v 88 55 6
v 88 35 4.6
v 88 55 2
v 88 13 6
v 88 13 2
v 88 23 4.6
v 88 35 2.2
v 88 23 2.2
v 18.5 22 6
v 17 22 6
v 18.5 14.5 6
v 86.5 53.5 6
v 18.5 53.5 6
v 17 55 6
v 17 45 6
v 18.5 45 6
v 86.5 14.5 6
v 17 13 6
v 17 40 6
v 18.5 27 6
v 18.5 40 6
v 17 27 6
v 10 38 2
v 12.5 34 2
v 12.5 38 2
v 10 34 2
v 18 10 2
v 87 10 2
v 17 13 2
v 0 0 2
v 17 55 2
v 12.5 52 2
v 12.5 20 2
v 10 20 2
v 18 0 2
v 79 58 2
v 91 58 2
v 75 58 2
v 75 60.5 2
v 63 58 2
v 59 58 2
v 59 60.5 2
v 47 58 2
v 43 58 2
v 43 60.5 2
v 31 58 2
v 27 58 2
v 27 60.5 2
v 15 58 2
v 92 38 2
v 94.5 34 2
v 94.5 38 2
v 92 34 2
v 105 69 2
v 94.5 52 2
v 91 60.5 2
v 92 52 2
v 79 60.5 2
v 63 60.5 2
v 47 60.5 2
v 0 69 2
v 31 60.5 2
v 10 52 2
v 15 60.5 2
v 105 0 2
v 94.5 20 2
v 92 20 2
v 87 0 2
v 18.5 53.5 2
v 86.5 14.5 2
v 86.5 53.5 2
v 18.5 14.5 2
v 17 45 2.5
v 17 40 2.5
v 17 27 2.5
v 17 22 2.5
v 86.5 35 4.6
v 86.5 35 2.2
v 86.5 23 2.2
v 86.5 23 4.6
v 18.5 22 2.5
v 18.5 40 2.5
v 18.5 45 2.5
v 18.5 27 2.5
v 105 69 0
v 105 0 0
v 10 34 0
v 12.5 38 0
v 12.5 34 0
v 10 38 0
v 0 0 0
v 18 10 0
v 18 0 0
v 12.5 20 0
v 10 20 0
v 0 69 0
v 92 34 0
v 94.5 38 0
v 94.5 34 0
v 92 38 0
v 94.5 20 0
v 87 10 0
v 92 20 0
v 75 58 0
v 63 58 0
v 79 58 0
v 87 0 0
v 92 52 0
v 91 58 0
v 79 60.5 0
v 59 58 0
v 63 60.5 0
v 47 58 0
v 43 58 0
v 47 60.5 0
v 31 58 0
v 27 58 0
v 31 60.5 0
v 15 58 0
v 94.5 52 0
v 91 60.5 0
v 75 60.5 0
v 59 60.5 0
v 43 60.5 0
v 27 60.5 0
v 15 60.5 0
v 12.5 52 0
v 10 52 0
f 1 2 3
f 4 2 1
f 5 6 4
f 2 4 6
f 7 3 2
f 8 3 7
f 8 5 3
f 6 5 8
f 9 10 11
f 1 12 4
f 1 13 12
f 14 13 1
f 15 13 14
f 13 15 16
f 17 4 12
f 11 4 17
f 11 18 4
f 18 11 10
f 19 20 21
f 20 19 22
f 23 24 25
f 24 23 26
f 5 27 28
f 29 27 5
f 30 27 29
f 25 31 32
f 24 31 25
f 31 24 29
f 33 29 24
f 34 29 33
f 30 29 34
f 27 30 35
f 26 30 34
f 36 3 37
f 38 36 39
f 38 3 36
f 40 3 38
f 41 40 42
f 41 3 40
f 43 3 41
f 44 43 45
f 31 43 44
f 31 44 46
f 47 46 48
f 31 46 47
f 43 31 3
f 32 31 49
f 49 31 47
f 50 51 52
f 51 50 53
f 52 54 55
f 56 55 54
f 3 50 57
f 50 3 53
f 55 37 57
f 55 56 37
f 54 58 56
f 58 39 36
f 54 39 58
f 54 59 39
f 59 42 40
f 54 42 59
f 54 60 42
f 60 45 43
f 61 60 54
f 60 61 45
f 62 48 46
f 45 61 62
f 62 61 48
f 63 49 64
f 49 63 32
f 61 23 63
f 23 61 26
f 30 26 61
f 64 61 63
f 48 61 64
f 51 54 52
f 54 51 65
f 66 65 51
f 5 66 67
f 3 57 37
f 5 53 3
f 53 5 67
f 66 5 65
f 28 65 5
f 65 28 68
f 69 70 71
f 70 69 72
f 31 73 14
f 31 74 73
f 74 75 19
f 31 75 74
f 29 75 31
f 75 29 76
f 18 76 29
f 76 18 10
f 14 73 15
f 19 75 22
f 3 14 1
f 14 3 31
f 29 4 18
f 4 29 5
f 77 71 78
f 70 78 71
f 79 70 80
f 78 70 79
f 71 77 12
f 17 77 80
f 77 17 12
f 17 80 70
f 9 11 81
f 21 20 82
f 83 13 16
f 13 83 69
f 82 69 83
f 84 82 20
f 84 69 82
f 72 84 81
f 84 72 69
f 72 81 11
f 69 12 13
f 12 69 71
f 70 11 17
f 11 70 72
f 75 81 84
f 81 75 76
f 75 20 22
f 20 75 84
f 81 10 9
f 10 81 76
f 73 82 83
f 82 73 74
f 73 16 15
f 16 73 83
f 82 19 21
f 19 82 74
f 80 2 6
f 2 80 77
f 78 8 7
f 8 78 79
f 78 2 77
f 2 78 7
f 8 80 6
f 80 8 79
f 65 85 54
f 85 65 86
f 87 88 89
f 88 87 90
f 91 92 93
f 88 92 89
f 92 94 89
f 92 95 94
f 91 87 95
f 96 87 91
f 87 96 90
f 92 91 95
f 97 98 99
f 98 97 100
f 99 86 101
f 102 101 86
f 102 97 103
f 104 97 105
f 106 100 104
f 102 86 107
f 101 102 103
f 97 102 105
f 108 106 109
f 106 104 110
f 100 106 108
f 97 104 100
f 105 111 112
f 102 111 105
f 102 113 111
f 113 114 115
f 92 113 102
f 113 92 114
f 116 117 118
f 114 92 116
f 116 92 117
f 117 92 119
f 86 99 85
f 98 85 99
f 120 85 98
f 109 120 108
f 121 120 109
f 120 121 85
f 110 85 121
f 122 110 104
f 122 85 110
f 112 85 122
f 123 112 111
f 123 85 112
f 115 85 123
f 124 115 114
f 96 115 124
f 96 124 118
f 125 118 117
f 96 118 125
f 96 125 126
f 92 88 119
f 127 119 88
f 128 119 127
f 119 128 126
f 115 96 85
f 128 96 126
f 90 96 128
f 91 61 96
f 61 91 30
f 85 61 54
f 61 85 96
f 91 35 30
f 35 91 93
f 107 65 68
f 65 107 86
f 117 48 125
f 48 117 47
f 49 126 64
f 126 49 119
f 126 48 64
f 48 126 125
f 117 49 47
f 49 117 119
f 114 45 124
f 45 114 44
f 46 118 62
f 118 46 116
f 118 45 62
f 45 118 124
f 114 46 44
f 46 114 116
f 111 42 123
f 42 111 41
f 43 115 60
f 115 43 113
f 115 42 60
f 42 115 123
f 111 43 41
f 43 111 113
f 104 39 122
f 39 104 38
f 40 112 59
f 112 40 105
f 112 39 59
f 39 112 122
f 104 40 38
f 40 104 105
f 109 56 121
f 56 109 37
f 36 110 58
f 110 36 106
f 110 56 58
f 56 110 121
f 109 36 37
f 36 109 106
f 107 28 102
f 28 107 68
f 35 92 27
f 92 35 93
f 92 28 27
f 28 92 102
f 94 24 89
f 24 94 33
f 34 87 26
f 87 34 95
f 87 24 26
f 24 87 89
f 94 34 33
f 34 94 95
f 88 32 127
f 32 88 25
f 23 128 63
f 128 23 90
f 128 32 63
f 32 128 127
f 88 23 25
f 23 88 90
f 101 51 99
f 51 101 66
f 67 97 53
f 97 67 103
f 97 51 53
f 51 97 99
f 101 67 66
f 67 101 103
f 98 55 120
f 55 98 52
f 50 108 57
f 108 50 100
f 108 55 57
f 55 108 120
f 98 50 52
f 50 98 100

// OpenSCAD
// file: ../../00_common/parameters.scad
// =============================================================================
// OpenMotorBridge - Global CAD Parameters & Settings
// =============================================================================
// File: hardware/cad/scad/00_common/parameters.scad
// Description: Global dimensional constants, manufacturing clearances and
//              circle resolution ($fn) for all OpenSCAD modules.
// =============================================================================

// --- 1. Circle & Curve Resolution ---
$fn = 60; // Smooth cylinders and holes for high-quality MJF 3D printing

// --- 2. Central Main Box Dimensions (3-Tier Sandwich) ---
MAIN_BOX_OUTER_L      = 110.0; // Outer length in X (mm)
MAIN_BOX_OUTER_W      = 74.0;  // Outer width in Y (mm)
MAIN_BOX_LOWER_H      = 17.0;  // Lower case height in Z (mm)
MAIN_BOX_MID_H        = 15.0;  // Mid tray height in Z (mm)
MAIN_BOX_LID_H        = 4.0;   // Lid plate thickness in Z (mm)
MAIN_BOX_WALL         = 2.5;   // Nominal wall thickness (mm)
MAIN_BOX_CORNER_POST  = 7.0;   // Corner clamping screw post size (mm, for M3 hex nut pockets)

// --- 3. Satellite Pod Dimensions (Universal Enlarged Envelope) ---
POD_OUTER_L           = 150.0; // Outer length in X (mm, standardized for serial PCBA 03 + Cardo/Sena/OMM)
POD_OUTER_W           = 70.0;  // Outer width in Y (mm)
POD_OUTER_H           = 38.0;  // Outer height in Z (mm)
POD_WALL              = 3.5;   // Nominal wall thickness (mm)
POD_BULKHEAD_X        = 18.0;  // Partition bulkhead position in X (mm)
POD_CHAMBER_L         = 132.0; // Sliding chamber length in X (mm, clears 130mm sled + 2mm margin)
POD_CHAMBER_W         = 63.0;  // Sliding chamber width in Y (mm)
POD_CHAMBER_H         = 31.0;  // Sliding chamber height in Z (mm)

// --- 4. Pod Linear Guide Rails (Poka-Yoke Tongue & Groove) ---
POD_GROOVE_W          = 3.0;   // Internal guide groove width in Z (mm)
POD_GROOVE_DEPTH      = 1.5;   // Internal guide groove depth in Y (mm)
POD_GROOVE_LEFT_Z     = 10.0;  // Center height of left groove (mm)
POD_GROOVE_RIGHT_Z    = 18.0;  // Center height of right groove (mm, asym offset)

CARTRIDGE_TONGUE_W    = 2.6;   // Cartridge tongue rail height in Z (mm, 0.2mm clearance)
CARTRIDGE_TONGUE_PROT = 1.4;   // Cartridge tongue protrusion in Y (mm, 0.1mm clearance)
CARTRIDGE_CHAMFER_L   = 4.0;   // 30° lead-in chamfer nose length (mm)

// --- 5. Cartridge Dimensions (Enlarged Universal Sled) ---
CARTRIDGE_BASE_L      = 130.0; // Sled length in X (mm, accommodates PCBA 03 + OEM Cardo Air-Mount/Sena/OMM serial layout)
CARTRIDGE_BASE_W      = 58.0;  // Sled width in Y (mm)
CARTRIDGE_BASE_H      = 28.0;  // Sled height in Z (mm)
CARTRIDGE_FACE_L      = 4.0;   // Front faceplate thickness in X (mm)
CARTRIDGE_FACE_W      = 64.0;  // Front faceplate width in Y (mm)
CARTRIDGE_FACE_H      = 34.0;  // Front faceplate height in Z (mm)

// --- 5a. RF Interface & Sealing Dimensions ---
SMA_BORE_R            = 3.25;  // Ø 6.5 mm through-hole for standard SMA bulkhead
SMA_ORECESS_R         = 4.75;  // Ø 9.5 mm recess for waterproof silicone O-ring
SMA_ORECESS_DEPTH     = 1.2;   // 1.2 mm deep O-ring compression pocket

// --- 5b. Magnetic Anti-Theft Lock System ---
LATCH_PIVOT_X         = 65.0;  // Center pivot position along sled X (mm, centered on 130mm sled)
LATCH_MAGNET_X        = 53.0;  // Ferromagnetic anchor position along sled X (mm)
LATCH_TOOTH_X         = 77.0;  // Locking sawtooth pawl position along sled X (mm)
LATCH_ARM_H           = 6.0;   // Rocker lever height in Z (mm)
LATCH_ARM_THICK       = 2.6;   // Rocker beam thickness in Y (mm)
LATCH_MAGNET_PIN_DIA  = 6.2;   // Bore for Ø 6.0 mm steel dowel pin (mm)
LATCH_SPRING_DIA      = 3.8;   // Bore for Ø 3.5 mm return compression spring (mm)

// --- 6. Standard Captive Hex Nut Pockets (DIN 934 / DIN 985 with +0.2 mm MJF/FDM clearance) ---
NUT_M2_SW             = 4.2;   // M2 across flats (nominal 4.0 mm)
NUT_M2_H              = 1.8;   // M2 thickness (nominal 1.6 mm)
NUT_M2_5_SW           = 5.2;   // M2.5 across flats (nominal 5.0 mm)
NUT_M2_5_H            = 2.2;   // M2.5 thickness (nominal 2.0 mm)
NUT_M3_SW             = 5.7;   // M3 across flats (nominal 5.5 mm)
NUT_M3_H              = 2.6;   // M3 thickness (nominal 2.4 mm)
NUT_M4_SW             = 7.2;   // M4 across flats (nominal 7.0 mm)
NUT_M4_H              = 3.4;   // M4 thickness (nominal 3.2 mm)
NUT_M5_SW             = 8.2;   // M5 across flats (nominal 8.0 mm)
NUT_M5_H              = 4.2;   // M5 thickness (nominal 4.0 mm)

// Direct Plastic Thread-Forming / Self-Tapping Pilot Holes in PA12 (100% Soldering-Iron Free)
M2_PILOT_HOLE_R       = 0.85;  // Core hole for M2 screws in PA12 (Ø 1.7 mm)
M2_5_PILOT_HOLE_R     = 1.05;  // Core hole for M2.5 screws in PA12 (Ø 2.1 mm)
M3_PILOT_HOLE_R       = 1.25;  // Core hole for M3 screws in PA12 (Ø 2.5 mm)

// --- 7. Screw & Clearance Dimensions ---
M2_SCREW_HOLE_R       = 1.1;   // M2 clearance hole (r = 1.1 mm -> Ø 2.2 mm)
M2_5_SCREW_HOLE_R     = 1.4;   // M2.5 clearance hole (r = 1.4 mm -> Ø 2.8 mm)
M3_SCREW_HOLE_R       = 1.65;  // M3 clearance hole (r = 1.65 mm -> Ø 3.3 mm)
M4_SCREW_HOLE_R       = 2.2;   // M4 clearance hole (r = 2.2 mm -> Ø 4.4 mm)
M8_BORE_R             = 4.0;   // M8 cable through-bore (r = 4.0 mm -> Ø 8.0 mm)
M8_STUDS_OUTER_R      = 6.0;   // M8 neck outer radius (Ø 12.0 mm)

// --- 8. Universal Front Node Enclosure Dimensions (Type E: 98 x 68 x 25 mm) ---
FRONT_NODE_PCB_L      = 82.0;  // PCB length in X (mm, PCBA 05)
FRONT_NODE_PCB_W      = 50.0;  // PCB width in Y (mm, PCBA 05)
FRONT_NODE_PCB_H      = 1.6;   // PCB thickness in Z (mm)
FRONT_NODE_PCB_R      = 2.5;   // PCB corner radius (mm)

FRONT_NODE_CHAMBER_L  = 86.0;  // Internal chamber length in X (mm, 2mm margin per side)
FRONT_NODE_CHAMBER_W  = 56.0;  // Internal chamber width in Y (mm, 3mm margin per side)
FRONT_NODE_TUB_H      = 17.5;  // Lower tub depth in Z (mm)
FRONT_NODE_LID_H      = 7.5;   // Upper lid height in Z (mm)
FRONT_NODE_WALL       = 2.5;   // Wall thickness in HP MJF PA12 (mm)
FRONT_NODE_CORNER_R   = 4.0;   // Outer enclosure corner radius (mm)

FRONT_NODE_OUTER_L    = FRONT_NODE_CHAMBER_L + 2 * FRONT_NODE_WALL + 7.0; // 98.0 mm
FRONT_NODE_OUTER_W    = FRONT_NODE_CHAMBER_W + 2 * FRONT_NODE_WALL + 7.0; // 68.0 mm
FRONT_NODE_OUTER_H    = FRONT_NODE_TUB_H + FRONT_NODE_LID_H;              // 25.0 mm

// PCB Standoff Heights & Radii (100% Soldering-Iron Free)
FRONT_NODE_STANDOFF_H = 3.0;   // Height of PCB standoffs from floor (mm)
FRONT_NODE_STANDOFF_R = 3.0;   // Outer radius of M2.5 screw bosses (mm)
FRONT_NODE_CORE_HOLE_R= M2_5_PILOT_HOLE_R; // Core hole for direct M2.5 screw engagement (Ø 2.1 mm)

// AMPS 4-Hole Mounting Pattern (38 x 30 mm with DIN 934 M4 Captive Nut Pockets)
AMPS_SPACING_X        = 38.0;  // AMPS hole distance in X (mm)
AMPS_SPACING_Y        = 30.0;  // AMPS hole distance in Y (mm)
AMPS_NUT_SW           = NUT_M4_SW; // Captive M4 hex nut pocket across flats (7.2 mm)
AMPS_NUT_H            = NUT_M4_H;  // Captive M4 hex nut pocket depth (3.4 mm)

// Acoustic Vent for Knowles SPH0645 MEMS
FRONT_NODE_MIC_HOLE_R = 1.25;  // Sound canal radius (Ø 2.5 mm)
FRONT_NODE_MIC_MEMB_R = 3.0;   // Gore ePTFE membrane pocket radius (Ø 6.0 mm)
FRONT_NODE_MIC_MEMB_D = 0.8;   // Membrane pocket depth (mm)
// main file
// =============================================================================
// OpenMotorBridge - Main Box: Mid Partition Floor (Zwischenboden)
// =============================================================================
// File: hardware/cad/scad/01_main_box/parts/011_mid_partition_floor.scad
// =============================================================================

include <../../00_common/parameters.scad>;

module main_box_mid_partition_floor(floor_l=105.0, floor_w=69.0, floor_t=2.0) {
    difference() {
        union() {
            // 1. Solid Base Floor Plate
            cube(size=[floor_l, floor_w, floor_t], center=false);

            // 2. Integrated LiPo Battery Cradle Frame (71.0 x 42.0 x 4.0 mm, fits 2200 mAh 5.0mm flat cell)
            translate([17.0, 13.0, floor_t]) {
                difference() {
                    cube(size=[71.0, 42.0, 4.0], center=false);
                    // Inner cavity for battery
                    translate([1.5, 1.5, -0.1])
                        cube(size=[68.0, 39.0, 4.2], center=false);
                    // Left Side: 2x Hinge Pivot Sockets (for 013_battery_antenna_bridge tabs)
                    translate([-0.5, 9.0, 0.5])
                        cube(size=[2.5, 5.0, 3.6], center=false);
                    translate([-0.5, 27.0, 0.5])
                        cube(size=[2.5, 5.0, 3.6], center=false);
                    // Right Side: Snap Catch Recess (for 013 cantilever latch barb)
                    translate([71.0 - 1.5, 10.0, 0.2])
                        cube(size=[2.0, 12.0, 2.4], center=false);
                }
            }
        }

        // 3. Wide Open Front Cable Bay (70 x 10 mm open toward front Y=0)
        // Seamlessly clears all 6 cables (12-Pin, 10-Pin, Battery, Power, LoRa, 2.4G)
        translate([18.0, -0.5, -0.5])
            cube(size=[69.0, 10.5, floor_t + 1.0], center=false);

        // 4. Enhanced Convective Ventilation & Air Circulation Slots (10x slots):
        // Rear Row (5x slots along y = 58.0 mm)
        for (i = [0:4]) {
            translate([15.0 + i * 16.0, 58.0, -0.5])
                cube(size=[12.0, 2.5, floor_t + 1.0], center=false);
        }

        // Left Side Flank (2x slots along x = 10.0 mm)
        translate([10.0, 20.0, -0.5]) cube(size=[2.5, 14.0, floor_t + 1.0], center=false);
        translate([10.0, 38.0, -0.5]) cube(size=[2.5, 14.0, floor_t + 1.0], center=false);

        // Right Side Flank (2x slots along x = 92.0 mm)
        translate([92.0, 20.0, -0.5]) cube(size=[2.5, 14.0, floor_t + 1.0], center=false);
        translate([92.0, 38.0, -0.5]) cube(size=[2.5, 14.0, floor_t + 1.0], center=false);
    }
}

// Standalone preview
main_box_mid_partition_floor();
